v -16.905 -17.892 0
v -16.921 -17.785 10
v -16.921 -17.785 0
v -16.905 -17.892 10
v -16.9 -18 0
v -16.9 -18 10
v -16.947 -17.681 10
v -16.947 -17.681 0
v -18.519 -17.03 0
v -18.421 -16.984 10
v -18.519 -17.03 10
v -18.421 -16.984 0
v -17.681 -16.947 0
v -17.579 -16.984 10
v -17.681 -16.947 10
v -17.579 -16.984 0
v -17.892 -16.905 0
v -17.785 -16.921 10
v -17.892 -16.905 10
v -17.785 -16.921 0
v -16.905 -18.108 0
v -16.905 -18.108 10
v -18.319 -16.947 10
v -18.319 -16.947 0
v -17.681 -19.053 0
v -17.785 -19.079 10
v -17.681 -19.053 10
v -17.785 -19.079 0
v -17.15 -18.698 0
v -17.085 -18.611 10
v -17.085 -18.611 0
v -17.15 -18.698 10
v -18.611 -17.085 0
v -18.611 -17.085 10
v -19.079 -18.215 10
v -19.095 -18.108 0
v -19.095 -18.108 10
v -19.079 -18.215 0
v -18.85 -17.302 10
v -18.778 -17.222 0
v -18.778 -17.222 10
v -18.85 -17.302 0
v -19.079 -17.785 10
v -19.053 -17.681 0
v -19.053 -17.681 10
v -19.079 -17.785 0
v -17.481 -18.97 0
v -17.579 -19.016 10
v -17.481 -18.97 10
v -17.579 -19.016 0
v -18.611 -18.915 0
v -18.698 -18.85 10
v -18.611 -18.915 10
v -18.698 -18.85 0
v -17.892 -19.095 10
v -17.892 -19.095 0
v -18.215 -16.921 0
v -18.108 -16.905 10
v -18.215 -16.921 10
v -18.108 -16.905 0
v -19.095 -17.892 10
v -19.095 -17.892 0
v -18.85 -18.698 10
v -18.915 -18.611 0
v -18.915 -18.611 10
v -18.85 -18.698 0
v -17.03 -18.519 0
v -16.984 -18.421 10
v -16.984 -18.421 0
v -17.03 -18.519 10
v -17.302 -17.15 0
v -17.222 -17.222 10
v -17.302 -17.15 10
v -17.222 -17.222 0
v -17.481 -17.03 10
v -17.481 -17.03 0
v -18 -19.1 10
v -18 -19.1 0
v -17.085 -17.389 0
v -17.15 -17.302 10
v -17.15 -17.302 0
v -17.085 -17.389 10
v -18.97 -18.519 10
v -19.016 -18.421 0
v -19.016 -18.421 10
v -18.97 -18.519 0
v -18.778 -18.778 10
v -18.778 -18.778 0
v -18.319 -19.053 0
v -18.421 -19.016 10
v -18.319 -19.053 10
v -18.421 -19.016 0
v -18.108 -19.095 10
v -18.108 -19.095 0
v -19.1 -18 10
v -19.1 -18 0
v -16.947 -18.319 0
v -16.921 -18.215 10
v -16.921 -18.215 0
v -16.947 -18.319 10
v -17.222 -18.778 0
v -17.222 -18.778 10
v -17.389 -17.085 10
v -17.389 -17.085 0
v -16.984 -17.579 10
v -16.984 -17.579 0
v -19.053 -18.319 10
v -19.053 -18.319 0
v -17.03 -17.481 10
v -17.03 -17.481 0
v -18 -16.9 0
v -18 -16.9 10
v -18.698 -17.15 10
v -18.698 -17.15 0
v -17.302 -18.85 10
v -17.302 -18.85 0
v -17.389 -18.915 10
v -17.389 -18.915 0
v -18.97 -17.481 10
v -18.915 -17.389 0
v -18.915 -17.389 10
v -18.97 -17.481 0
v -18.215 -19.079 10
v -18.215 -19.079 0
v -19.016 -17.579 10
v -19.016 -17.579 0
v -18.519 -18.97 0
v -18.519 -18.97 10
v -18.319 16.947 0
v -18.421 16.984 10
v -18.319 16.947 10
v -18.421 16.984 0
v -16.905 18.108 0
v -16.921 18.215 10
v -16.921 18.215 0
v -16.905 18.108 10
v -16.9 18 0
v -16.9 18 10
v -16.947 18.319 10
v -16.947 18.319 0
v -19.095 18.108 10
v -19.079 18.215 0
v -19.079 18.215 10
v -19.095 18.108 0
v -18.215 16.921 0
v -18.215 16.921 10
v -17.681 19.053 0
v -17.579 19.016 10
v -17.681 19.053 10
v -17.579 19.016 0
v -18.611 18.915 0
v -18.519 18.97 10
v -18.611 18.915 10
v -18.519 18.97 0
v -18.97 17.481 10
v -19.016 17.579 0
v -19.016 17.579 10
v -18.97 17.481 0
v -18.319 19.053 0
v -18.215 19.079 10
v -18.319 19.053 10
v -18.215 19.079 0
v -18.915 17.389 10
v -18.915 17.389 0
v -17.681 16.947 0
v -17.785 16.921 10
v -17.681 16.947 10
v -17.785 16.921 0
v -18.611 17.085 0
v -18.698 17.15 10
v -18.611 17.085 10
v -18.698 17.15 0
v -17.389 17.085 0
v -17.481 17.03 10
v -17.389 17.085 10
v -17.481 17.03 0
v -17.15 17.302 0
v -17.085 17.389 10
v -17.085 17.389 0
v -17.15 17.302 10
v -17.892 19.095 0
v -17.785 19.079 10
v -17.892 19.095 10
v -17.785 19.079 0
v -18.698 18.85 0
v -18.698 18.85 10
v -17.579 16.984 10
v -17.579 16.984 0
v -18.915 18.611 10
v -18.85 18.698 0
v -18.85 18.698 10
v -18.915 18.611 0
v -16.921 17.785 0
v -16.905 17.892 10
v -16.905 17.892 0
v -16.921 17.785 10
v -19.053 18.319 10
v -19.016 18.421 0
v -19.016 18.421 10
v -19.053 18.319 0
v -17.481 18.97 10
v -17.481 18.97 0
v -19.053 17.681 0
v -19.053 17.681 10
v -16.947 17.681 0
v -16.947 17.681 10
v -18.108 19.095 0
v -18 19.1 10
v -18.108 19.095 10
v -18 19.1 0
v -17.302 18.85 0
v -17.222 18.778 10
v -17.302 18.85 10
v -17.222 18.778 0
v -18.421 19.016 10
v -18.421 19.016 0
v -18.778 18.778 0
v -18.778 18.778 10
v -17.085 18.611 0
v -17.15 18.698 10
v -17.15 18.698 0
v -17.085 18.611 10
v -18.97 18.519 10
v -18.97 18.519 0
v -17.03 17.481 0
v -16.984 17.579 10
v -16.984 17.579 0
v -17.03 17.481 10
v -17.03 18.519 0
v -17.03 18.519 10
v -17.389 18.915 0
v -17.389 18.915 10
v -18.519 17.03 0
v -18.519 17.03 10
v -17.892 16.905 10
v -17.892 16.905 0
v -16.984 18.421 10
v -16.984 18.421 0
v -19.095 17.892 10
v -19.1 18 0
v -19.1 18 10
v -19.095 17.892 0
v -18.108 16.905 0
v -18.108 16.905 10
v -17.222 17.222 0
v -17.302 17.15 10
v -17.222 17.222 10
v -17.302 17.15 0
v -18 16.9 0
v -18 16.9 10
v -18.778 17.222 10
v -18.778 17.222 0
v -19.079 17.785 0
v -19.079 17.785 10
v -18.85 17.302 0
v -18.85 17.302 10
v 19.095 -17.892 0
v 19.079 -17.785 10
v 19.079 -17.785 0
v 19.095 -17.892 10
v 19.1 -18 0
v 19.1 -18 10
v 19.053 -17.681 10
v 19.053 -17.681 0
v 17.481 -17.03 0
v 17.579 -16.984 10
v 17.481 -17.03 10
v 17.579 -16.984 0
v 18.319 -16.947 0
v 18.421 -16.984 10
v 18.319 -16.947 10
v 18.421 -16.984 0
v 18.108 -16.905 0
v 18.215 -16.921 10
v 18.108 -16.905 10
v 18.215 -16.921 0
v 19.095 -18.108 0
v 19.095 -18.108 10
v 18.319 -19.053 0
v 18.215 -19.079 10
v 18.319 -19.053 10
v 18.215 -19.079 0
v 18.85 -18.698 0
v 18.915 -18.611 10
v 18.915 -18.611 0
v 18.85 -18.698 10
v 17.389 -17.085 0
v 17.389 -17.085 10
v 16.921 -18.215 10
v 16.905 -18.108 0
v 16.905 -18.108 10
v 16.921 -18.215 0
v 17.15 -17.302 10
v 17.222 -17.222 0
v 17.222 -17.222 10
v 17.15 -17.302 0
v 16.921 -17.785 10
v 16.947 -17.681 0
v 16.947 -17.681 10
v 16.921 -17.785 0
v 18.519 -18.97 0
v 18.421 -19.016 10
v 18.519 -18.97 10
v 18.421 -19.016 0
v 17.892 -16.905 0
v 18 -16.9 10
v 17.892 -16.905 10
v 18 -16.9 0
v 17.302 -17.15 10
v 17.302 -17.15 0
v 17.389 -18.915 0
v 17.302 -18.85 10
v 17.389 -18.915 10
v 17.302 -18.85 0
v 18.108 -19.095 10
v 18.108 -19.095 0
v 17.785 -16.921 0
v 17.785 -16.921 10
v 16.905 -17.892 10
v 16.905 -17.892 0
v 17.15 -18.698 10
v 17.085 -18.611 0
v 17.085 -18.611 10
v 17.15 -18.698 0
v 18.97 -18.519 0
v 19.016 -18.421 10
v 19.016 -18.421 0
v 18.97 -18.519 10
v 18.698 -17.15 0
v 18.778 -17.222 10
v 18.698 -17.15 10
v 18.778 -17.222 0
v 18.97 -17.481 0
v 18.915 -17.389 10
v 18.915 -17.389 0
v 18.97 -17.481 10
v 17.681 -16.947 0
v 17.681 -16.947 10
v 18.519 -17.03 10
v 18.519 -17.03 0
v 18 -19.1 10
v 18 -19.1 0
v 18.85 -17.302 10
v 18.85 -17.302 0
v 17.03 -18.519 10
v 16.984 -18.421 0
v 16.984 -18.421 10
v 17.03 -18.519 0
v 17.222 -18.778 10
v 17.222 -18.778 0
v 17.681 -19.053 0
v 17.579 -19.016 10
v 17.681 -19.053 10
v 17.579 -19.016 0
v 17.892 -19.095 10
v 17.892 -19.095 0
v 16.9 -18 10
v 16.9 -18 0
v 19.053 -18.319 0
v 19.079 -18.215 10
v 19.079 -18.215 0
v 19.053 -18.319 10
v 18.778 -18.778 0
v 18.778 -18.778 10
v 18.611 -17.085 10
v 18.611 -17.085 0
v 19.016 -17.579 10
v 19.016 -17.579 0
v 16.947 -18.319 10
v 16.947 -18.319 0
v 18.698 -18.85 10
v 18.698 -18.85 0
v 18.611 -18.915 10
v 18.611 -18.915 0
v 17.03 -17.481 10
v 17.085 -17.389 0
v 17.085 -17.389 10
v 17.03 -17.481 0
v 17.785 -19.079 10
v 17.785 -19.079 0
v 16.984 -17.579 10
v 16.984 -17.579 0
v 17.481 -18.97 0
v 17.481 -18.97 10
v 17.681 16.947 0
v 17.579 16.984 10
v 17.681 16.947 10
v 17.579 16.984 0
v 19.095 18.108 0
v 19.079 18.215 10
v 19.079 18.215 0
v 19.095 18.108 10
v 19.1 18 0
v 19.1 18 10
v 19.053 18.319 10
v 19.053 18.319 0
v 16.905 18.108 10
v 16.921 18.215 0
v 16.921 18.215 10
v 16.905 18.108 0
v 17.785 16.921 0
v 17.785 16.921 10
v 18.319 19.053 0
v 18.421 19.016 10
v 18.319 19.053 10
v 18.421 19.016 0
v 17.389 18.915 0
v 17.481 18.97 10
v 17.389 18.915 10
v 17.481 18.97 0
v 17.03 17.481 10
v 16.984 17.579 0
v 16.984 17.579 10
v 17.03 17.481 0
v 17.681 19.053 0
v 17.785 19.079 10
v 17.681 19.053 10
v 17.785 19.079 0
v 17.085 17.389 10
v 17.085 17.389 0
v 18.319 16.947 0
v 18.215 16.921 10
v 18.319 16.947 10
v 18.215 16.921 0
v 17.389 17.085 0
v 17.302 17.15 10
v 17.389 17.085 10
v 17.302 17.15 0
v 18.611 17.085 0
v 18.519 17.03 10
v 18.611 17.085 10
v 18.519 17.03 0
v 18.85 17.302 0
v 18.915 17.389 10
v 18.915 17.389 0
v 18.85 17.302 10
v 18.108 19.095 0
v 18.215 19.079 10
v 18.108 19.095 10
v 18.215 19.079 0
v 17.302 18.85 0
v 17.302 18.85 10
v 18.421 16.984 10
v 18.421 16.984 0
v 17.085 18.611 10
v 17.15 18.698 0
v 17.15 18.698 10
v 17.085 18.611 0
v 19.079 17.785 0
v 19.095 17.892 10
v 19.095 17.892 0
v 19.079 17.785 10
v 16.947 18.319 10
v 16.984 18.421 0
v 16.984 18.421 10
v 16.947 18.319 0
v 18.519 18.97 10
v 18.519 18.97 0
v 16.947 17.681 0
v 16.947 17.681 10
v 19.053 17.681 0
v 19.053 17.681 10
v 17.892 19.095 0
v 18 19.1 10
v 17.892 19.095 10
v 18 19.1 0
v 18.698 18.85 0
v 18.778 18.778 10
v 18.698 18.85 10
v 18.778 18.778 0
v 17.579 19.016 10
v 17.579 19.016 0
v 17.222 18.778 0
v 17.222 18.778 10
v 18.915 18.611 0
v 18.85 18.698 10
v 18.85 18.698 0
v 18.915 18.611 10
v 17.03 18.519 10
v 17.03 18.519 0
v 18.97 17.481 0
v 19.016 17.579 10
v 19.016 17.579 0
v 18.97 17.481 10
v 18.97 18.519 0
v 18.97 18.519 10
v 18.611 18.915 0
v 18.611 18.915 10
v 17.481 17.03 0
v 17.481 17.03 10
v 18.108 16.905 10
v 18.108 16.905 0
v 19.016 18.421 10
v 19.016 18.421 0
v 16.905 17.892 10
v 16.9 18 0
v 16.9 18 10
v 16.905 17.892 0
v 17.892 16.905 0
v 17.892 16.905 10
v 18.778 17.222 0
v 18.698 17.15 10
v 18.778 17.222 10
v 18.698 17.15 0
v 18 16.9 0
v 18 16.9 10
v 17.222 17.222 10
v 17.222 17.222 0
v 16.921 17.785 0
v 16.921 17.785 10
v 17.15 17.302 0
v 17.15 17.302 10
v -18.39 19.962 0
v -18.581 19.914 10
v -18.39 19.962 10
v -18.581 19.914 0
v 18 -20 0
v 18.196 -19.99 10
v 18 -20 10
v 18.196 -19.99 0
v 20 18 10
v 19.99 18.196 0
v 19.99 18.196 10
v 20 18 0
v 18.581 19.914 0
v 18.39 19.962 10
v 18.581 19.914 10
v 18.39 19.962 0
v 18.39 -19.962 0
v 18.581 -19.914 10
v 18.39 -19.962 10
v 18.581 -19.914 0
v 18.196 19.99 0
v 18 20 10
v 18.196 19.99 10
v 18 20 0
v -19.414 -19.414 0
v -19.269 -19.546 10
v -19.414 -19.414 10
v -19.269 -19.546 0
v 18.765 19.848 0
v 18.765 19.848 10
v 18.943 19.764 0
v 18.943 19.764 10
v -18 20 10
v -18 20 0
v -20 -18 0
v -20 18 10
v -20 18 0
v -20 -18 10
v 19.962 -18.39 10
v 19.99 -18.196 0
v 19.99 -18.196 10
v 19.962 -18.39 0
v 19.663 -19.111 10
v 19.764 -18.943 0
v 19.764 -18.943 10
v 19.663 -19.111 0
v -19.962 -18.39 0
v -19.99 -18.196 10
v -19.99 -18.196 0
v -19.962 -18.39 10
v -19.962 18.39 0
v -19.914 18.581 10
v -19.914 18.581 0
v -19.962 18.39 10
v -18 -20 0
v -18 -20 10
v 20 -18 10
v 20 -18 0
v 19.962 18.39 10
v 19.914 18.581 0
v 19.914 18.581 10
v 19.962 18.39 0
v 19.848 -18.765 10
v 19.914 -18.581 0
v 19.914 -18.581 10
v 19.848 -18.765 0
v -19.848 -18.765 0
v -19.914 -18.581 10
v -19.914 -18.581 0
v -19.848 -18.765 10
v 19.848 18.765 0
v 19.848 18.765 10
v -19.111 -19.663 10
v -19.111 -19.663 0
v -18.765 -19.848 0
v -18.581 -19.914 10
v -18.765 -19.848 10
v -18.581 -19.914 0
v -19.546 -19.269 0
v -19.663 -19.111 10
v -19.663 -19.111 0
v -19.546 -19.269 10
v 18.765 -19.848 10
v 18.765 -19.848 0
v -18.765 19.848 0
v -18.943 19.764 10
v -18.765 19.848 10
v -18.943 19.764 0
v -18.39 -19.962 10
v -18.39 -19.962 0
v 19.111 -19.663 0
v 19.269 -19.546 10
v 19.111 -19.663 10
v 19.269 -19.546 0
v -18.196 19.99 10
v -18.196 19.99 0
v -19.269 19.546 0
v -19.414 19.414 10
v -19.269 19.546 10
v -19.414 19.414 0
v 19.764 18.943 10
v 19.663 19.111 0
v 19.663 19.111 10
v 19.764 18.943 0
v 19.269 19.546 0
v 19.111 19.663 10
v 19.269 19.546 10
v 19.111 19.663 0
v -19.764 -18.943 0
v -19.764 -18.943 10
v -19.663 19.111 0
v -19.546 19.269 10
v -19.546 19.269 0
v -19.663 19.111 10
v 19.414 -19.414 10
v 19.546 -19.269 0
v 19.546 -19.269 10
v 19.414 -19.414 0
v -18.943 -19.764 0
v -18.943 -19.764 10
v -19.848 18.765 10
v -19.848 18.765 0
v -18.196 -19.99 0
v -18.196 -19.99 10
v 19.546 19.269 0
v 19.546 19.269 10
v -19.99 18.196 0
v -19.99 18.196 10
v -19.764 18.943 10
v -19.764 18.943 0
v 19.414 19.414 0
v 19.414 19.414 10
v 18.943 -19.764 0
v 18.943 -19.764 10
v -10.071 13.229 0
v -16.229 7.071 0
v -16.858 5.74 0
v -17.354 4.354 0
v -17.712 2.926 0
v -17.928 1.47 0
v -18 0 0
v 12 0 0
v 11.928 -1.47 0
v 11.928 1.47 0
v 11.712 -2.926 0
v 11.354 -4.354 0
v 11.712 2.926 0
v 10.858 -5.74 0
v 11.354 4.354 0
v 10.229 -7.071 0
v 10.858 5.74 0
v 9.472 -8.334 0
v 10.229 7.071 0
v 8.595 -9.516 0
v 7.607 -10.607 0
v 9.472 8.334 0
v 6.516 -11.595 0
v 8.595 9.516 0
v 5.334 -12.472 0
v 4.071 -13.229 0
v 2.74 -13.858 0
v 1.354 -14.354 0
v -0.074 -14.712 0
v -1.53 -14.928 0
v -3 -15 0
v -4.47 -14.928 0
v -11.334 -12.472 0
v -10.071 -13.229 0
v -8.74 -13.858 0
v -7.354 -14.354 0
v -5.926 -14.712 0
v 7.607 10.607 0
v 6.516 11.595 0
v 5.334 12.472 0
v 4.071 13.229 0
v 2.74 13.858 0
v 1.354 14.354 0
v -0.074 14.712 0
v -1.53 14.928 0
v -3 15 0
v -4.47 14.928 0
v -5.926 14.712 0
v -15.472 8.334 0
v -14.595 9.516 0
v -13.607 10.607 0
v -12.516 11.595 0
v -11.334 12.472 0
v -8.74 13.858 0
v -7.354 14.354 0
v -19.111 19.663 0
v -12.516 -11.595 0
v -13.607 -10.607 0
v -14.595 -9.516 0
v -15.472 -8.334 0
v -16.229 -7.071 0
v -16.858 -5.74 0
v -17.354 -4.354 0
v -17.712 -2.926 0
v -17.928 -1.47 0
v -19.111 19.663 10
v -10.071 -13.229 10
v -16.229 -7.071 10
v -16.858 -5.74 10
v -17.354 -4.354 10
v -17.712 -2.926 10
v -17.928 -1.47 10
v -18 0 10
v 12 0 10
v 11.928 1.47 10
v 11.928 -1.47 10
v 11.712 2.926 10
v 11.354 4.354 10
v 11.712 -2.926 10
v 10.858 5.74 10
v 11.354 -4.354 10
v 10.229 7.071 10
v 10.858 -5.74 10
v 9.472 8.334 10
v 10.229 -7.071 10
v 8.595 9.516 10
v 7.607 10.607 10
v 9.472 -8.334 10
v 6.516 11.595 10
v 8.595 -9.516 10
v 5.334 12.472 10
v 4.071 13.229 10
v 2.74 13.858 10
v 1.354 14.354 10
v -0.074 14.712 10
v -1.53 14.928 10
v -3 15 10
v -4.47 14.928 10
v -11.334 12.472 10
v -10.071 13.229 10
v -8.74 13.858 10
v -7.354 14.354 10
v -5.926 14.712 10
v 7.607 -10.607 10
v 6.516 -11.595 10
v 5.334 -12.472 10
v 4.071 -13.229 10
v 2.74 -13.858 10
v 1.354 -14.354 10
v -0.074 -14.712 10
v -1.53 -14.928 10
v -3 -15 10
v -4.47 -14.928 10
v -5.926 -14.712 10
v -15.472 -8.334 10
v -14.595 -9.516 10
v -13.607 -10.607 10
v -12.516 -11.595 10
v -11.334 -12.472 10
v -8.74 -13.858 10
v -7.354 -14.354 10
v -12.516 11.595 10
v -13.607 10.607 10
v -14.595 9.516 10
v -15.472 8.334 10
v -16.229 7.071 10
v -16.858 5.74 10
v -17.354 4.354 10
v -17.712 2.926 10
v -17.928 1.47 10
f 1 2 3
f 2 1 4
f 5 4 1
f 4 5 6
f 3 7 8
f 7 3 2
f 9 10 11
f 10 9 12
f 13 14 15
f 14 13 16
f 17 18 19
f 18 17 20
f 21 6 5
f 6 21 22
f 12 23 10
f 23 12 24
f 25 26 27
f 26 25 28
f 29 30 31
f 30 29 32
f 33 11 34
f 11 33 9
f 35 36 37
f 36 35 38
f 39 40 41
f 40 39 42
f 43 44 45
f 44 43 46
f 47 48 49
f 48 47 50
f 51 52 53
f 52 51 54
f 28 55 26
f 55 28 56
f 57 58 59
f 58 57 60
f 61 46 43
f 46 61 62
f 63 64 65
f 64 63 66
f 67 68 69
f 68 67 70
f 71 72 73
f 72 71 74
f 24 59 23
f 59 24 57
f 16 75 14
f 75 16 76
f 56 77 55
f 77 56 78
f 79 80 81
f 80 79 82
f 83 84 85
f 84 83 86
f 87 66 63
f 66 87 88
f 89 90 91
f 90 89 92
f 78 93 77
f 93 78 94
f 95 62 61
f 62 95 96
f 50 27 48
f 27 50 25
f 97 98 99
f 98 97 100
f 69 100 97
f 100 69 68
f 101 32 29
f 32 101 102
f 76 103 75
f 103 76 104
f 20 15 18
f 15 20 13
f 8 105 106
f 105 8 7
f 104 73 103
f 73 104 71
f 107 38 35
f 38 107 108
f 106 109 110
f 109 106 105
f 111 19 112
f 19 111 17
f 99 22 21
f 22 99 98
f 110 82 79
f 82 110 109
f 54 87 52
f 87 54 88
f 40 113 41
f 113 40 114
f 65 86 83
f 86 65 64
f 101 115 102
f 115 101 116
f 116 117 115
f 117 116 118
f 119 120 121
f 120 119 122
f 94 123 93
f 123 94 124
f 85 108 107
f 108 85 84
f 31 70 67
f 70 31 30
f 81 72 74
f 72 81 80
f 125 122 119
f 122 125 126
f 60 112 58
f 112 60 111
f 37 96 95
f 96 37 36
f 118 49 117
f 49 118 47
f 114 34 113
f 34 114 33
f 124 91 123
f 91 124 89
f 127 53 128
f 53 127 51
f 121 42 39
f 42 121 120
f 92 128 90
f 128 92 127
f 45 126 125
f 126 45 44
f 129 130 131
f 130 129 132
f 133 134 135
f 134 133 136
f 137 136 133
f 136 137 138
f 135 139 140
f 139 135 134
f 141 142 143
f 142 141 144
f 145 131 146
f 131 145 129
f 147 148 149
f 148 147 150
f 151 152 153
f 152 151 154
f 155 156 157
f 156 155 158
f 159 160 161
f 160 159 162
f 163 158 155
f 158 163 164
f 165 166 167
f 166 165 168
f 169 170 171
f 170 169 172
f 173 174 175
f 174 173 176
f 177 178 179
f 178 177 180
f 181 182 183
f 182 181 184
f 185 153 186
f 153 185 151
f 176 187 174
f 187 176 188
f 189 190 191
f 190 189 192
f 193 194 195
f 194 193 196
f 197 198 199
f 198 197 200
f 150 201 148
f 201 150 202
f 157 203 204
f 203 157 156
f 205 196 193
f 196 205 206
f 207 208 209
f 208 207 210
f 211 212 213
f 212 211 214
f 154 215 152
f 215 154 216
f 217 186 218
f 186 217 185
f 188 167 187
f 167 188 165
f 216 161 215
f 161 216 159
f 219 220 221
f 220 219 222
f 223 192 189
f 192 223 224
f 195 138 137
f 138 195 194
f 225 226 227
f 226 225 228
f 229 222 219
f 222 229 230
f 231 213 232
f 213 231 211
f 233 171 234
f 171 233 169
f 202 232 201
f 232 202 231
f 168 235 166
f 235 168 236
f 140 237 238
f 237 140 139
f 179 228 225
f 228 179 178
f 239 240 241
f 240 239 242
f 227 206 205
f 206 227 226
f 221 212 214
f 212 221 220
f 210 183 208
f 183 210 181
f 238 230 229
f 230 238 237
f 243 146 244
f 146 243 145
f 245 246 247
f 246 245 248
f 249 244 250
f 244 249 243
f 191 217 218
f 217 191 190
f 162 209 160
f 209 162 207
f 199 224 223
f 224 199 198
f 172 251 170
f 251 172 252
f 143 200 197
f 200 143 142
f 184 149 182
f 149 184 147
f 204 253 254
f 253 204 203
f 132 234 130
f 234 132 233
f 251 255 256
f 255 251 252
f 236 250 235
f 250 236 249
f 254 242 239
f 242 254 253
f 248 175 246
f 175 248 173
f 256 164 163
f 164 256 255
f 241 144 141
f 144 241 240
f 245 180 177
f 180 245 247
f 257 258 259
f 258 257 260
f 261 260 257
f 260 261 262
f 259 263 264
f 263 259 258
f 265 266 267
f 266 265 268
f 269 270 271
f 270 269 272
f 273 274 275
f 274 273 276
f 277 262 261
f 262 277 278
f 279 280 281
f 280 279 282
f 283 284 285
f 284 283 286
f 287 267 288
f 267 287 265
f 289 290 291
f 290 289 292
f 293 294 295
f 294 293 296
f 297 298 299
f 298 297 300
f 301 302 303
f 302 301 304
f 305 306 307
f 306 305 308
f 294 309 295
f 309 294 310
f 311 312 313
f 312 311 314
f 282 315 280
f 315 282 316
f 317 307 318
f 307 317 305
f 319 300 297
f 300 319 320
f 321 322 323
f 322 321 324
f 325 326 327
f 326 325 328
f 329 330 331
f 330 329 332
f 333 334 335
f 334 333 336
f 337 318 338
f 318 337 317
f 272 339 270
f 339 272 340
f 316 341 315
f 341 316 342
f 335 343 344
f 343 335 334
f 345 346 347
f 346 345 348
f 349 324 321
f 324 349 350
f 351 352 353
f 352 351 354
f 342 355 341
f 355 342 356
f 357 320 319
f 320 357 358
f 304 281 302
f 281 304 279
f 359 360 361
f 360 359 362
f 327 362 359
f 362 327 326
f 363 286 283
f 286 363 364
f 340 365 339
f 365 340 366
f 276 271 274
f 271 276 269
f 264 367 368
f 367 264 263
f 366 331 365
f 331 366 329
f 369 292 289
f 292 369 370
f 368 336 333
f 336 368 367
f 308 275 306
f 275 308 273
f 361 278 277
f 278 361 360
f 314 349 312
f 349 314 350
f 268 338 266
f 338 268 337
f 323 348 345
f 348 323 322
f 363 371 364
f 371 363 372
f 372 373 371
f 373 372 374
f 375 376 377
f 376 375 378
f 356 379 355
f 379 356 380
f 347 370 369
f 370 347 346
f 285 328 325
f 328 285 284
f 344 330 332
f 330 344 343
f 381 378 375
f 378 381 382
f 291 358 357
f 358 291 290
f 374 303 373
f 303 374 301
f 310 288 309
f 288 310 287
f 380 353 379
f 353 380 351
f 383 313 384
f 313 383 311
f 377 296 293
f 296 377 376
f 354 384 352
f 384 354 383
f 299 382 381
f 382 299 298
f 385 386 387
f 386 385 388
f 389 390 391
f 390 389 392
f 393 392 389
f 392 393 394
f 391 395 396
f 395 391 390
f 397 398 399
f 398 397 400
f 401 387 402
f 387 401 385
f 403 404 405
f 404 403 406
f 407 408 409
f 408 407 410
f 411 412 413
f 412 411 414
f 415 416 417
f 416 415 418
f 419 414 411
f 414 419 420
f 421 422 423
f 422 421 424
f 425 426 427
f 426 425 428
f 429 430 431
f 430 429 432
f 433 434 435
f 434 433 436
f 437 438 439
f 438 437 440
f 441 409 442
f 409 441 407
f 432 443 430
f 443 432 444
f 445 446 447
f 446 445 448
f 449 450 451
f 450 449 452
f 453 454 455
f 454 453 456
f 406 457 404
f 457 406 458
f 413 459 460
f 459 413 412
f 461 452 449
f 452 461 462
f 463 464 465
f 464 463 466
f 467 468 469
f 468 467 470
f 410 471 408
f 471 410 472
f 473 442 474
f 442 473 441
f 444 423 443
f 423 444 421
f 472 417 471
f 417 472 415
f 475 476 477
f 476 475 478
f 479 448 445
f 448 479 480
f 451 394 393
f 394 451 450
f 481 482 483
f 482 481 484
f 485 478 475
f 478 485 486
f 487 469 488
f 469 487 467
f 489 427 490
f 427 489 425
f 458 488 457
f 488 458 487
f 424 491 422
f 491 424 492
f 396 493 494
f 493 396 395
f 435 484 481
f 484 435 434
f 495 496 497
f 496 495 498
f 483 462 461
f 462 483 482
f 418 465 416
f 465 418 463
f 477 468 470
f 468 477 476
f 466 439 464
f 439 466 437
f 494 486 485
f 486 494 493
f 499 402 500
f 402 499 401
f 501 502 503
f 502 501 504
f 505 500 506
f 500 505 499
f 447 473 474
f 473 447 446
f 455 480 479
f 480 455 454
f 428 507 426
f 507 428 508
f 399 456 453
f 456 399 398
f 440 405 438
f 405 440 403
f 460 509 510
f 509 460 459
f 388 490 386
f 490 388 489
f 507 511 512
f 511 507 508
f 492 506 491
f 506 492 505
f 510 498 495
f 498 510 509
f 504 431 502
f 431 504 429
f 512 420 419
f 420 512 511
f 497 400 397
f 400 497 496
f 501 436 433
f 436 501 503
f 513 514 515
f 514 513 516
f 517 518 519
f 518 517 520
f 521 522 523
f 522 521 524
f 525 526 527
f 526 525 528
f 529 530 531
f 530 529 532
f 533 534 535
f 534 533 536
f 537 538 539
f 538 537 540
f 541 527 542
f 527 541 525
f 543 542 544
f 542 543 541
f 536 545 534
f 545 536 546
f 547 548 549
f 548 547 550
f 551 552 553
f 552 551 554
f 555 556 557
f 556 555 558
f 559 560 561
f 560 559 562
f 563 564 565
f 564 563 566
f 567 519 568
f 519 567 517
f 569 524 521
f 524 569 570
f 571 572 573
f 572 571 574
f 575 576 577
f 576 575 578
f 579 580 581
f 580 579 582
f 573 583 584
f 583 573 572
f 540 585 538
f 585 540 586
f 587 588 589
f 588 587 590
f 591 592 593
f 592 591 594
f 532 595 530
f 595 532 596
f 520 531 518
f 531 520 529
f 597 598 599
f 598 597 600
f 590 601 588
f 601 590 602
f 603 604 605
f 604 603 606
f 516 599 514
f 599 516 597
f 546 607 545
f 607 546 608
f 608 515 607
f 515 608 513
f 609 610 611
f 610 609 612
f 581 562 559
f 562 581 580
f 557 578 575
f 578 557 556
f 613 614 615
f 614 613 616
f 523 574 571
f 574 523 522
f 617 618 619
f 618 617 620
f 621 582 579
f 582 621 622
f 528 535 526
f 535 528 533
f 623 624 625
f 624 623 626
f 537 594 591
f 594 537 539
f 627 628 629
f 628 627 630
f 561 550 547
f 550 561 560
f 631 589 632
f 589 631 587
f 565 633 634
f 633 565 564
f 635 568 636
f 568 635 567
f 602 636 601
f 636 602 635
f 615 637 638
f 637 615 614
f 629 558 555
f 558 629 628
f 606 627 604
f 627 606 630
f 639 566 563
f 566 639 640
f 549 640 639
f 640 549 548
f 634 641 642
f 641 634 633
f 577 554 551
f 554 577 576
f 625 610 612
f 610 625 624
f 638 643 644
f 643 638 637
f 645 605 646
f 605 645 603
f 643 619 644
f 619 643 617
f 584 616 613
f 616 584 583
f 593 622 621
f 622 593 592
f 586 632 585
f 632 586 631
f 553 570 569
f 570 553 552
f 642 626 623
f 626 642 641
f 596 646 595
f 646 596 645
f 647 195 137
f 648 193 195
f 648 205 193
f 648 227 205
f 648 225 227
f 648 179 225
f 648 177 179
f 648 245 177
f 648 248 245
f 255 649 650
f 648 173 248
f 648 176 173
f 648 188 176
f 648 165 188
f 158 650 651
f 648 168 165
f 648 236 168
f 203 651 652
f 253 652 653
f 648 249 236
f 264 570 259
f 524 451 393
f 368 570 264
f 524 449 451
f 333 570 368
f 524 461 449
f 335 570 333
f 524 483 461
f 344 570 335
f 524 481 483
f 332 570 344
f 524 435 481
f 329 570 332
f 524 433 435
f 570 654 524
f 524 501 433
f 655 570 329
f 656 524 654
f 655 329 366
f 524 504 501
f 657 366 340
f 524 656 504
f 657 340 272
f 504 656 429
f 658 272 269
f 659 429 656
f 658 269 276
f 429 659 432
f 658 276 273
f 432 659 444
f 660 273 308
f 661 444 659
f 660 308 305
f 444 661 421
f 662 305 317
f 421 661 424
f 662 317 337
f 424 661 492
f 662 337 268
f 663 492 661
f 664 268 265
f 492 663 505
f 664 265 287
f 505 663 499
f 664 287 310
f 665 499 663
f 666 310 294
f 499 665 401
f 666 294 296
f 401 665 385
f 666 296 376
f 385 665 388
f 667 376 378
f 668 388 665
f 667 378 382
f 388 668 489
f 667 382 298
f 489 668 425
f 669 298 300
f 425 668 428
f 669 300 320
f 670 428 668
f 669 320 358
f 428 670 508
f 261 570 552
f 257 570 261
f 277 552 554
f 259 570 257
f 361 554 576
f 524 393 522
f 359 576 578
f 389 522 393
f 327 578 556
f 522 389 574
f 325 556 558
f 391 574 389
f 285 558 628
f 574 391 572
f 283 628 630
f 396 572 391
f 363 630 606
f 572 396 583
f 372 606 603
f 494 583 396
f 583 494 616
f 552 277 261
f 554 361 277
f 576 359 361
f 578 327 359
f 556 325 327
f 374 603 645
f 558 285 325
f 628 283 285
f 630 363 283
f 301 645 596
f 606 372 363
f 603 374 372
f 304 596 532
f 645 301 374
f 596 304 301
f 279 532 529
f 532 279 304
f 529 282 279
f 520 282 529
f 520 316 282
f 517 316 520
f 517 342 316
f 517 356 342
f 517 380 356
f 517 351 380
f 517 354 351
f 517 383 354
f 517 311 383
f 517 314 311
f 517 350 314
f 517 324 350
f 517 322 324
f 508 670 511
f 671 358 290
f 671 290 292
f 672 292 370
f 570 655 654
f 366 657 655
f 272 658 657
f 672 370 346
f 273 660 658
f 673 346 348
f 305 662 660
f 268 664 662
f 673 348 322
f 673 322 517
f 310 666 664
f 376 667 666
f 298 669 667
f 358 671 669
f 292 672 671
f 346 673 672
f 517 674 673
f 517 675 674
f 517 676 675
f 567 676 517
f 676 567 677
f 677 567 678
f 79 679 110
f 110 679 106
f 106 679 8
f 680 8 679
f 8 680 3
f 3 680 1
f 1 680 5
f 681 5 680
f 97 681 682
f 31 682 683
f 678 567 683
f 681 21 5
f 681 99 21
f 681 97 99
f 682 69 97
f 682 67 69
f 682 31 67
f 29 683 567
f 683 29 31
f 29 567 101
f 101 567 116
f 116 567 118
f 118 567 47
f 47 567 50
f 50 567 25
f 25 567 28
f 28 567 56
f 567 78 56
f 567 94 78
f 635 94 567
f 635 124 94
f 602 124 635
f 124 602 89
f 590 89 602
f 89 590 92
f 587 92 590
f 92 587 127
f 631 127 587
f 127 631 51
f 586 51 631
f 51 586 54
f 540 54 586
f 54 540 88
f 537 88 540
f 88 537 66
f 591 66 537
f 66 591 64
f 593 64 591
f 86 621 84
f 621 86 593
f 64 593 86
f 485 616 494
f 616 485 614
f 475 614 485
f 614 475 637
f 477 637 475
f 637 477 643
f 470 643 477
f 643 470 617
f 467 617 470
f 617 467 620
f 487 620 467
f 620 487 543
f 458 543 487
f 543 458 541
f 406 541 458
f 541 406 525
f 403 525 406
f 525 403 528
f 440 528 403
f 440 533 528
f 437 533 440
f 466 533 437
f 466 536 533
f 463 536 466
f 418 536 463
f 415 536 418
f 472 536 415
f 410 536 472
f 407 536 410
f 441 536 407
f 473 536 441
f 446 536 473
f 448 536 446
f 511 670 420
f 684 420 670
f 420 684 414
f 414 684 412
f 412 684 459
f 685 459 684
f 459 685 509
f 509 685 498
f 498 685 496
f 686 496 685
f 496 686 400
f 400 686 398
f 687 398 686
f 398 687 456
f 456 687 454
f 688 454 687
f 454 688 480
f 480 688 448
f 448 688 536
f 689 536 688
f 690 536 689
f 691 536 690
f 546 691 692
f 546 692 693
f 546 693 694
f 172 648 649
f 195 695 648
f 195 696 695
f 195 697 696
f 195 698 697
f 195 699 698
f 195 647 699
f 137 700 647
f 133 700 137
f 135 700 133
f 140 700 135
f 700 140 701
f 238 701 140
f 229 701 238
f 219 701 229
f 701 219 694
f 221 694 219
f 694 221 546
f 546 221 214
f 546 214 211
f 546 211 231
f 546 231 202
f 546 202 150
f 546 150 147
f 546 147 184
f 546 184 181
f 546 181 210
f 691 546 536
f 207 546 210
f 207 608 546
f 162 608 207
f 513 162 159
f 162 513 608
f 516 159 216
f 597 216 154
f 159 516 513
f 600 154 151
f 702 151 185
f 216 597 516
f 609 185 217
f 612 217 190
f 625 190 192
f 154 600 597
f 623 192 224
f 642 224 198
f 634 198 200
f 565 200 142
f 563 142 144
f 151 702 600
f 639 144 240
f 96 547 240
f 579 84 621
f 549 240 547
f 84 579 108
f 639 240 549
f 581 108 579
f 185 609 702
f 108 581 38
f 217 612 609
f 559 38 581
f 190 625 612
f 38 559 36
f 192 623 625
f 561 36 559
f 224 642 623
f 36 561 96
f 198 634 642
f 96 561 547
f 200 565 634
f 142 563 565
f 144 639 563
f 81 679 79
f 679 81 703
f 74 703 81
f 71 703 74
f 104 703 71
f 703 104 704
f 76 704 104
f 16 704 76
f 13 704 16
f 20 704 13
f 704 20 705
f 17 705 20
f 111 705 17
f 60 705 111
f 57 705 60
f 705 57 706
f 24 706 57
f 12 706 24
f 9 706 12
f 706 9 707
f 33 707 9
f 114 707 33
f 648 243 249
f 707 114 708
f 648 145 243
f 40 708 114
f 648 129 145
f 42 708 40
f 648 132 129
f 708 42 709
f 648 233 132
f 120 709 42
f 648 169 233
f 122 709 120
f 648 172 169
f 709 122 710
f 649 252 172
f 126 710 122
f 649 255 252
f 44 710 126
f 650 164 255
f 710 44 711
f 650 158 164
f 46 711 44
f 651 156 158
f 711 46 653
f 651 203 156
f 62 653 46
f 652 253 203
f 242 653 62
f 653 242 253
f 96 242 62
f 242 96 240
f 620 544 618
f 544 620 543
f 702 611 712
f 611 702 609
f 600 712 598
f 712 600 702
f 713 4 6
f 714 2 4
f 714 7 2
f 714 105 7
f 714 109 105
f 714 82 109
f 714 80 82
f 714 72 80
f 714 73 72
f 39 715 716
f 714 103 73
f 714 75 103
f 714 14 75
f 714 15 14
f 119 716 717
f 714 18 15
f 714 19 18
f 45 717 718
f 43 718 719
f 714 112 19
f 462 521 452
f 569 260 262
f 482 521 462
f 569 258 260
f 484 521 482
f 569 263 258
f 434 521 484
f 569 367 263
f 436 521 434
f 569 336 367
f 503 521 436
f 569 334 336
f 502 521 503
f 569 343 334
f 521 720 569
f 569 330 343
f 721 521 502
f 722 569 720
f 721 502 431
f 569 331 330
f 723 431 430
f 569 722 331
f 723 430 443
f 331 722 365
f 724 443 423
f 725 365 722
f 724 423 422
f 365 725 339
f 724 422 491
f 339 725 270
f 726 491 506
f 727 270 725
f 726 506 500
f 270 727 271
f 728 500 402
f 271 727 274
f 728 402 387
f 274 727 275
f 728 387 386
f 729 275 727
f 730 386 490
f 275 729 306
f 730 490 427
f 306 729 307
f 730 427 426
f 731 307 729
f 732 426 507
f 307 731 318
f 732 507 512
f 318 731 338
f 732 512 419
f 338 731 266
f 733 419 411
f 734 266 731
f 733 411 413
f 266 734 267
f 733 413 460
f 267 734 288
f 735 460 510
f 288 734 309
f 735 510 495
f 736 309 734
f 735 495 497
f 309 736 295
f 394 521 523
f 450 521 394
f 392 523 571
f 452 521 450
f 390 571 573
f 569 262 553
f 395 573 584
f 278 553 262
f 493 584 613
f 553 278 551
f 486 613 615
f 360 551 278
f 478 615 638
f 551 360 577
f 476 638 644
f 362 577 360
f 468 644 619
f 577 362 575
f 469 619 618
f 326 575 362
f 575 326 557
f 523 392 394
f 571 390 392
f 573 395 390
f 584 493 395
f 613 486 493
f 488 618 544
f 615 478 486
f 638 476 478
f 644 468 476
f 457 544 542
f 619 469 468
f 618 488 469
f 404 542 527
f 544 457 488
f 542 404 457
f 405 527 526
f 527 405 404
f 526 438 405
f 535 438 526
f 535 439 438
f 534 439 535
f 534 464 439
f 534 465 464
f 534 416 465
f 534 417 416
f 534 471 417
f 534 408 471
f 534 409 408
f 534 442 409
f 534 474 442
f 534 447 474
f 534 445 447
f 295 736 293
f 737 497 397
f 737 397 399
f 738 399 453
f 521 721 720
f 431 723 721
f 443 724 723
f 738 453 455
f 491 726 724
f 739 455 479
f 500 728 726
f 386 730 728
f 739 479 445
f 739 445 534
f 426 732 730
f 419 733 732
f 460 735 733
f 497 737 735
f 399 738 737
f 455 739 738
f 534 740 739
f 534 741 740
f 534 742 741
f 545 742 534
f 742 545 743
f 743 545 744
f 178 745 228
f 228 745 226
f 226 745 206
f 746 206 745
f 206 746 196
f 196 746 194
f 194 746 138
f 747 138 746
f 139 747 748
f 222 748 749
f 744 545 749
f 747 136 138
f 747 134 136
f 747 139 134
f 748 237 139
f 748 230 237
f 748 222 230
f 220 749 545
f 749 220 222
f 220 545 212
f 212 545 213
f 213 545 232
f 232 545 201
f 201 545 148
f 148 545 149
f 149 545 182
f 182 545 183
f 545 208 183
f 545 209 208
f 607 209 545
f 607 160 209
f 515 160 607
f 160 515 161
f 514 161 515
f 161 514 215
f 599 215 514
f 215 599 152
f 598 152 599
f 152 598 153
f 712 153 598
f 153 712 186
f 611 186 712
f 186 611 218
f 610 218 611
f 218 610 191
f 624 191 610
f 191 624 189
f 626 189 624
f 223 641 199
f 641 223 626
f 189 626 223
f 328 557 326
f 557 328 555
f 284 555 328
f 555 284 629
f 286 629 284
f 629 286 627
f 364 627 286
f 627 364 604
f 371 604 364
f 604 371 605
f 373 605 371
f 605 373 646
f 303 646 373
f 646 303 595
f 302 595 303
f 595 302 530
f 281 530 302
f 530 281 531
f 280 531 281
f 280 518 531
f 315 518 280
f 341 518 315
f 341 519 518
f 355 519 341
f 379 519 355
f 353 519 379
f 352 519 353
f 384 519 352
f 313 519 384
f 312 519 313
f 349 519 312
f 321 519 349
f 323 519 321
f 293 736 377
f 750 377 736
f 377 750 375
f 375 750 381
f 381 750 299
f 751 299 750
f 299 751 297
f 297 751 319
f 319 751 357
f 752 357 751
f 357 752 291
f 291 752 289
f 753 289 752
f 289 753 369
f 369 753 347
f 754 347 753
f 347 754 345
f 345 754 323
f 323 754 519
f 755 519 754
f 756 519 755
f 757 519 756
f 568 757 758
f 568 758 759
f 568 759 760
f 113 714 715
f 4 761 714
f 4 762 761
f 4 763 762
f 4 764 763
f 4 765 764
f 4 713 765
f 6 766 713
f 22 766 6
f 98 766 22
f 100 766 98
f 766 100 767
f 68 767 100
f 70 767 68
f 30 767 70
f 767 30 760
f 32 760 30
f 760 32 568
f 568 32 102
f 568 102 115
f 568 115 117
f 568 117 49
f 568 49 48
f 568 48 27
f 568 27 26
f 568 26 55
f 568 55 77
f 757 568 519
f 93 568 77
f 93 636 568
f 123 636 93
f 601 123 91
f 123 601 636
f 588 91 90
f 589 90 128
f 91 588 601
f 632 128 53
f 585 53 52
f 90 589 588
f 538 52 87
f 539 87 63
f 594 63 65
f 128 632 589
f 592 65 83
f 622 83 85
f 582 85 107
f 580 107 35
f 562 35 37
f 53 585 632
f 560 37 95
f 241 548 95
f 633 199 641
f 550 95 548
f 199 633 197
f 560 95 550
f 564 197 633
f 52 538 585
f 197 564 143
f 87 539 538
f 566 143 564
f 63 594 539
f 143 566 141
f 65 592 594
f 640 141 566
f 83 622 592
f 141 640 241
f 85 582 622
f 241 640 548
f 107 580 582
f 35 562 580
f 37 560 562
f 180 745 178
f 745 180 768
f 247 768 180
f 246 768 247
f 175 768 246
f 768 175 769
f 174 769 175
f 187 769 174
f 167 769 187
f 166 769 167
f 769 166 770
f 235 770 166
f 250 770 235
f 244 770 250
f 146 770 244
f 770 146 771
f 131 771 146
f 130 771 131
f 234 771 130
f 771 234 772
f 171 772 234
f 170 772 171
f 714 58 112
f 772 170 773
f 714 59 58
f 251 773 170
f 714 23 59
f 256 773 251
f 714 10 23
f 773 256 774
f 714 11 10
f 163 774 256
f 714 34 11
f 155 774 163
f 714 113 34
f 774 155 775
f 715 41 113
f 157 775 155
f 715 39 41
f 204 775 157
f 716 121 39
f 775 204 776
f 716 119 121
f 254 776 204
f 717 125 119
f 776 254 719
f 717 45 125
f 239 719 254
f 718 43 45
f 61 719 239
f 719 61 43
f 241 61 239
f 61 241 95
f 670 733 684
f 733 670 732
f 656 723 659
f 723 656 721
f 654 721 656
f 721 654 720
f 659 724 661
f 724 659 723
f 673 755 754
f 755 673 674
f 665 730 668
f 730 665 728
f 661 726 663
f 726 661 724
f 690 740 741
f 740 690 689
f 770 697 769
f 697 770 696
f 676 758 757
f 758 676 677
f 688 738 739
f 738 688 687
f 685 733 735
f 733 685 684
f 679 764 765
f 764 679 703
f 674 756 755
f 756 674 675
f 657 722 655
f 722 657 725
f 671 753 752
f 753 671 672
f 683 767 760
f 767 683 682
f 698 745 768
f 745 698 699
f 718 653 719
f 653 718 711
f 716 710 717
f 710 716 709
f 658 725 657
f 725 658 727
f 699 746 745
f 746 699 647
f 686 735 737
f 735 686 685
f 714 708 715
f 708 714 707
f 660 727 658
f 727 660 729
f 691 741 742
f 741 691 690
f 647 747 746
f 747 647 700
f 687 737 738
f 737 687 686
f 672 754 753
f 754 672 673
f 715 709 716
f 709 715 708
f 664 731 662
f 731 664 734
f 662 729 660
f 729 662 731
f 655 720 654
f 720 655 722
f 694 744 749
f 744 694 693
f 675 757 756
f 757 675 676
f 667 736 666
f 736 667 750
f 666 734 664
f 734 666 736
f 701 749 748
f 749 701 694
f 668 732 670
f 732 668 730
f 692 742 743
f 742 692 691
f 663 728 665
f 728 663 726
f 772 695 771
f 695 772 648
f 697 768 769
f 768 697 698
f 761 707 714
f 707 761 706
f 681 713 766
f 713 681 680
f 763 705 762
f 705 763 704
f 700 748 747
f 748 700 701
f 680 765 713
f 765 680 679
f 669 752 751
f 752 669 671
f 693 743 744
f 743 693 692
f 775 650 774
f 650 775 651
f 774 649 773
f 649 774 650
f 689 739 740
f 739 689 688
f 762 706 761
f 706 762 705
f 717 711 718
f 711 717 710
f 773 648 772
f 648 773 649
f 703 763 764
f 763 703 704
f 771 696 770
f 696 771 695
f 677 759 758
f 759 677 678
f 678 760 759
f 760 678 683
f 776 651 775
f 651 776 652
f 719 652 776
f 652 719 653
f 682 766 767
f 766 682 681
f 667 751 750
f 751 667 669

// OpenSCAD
$fn = 64;

fan40x40_radial(10);

module fan_outline(size, height) {
    r = 2;
    linear_extrude(height = height, convexity = 10) {
        translate([-size/2+r, -size/2]) square([size-2*r, size]);
        translate([-size/2, -size/2+r]) square([size, size-2*r]);
        for(x = [-size/2+r, size/2-r]) for(y = [-size/2+r, size/2-r])
            translate([x, y]) circle(r = r);
    }
}

module fan_holes(d) {   
    for(x = [-d, d]) for(y = [-d, d])
        translate([x, y]) for(i=[0:$children-1]) children(i); 
}

module fan40x40_radial_outline(height, extra = 0) {
    fan_outline(40+extra, height = height);
}

module fan40x40_radial(height, extra = 0) {
    difference() {
        fan_outline(40+extra, height = height);
        fan_holes(18) cylinder(d = 2.2+extra, h = height*2+1, center = true);
        translate([-3, 0, 0])cylinder(r = 15, h = height*2+1, center = true);
    }
}

module fan40x40_outline(height, extra = 0) {
    fan_outline(40+extra, height = height);
}

module fan40x40(height, extra = 0) {
    difference() {
        fan_outline(40+extra, height = height);
        fan_holes(16) cylinder(r = 2.15+extra, h = height*2+1, center = true);
        cylinder(r = 19, h = height*2+1, center = true);
    }
}

module fan30x30_outline(height, extra = 0) {
    fan_outline(30+extra, height = height);
}
   
module fan30x30(height, extra = 0) {
    difference() {
        fan_outline(30+extra, height = height);
        fan_holes(12) cylinder(r = 1.6+extra, h = height*2+1, center = true);
        cylinder(r = 14, h = height*2+1, center = true);
    }
}
